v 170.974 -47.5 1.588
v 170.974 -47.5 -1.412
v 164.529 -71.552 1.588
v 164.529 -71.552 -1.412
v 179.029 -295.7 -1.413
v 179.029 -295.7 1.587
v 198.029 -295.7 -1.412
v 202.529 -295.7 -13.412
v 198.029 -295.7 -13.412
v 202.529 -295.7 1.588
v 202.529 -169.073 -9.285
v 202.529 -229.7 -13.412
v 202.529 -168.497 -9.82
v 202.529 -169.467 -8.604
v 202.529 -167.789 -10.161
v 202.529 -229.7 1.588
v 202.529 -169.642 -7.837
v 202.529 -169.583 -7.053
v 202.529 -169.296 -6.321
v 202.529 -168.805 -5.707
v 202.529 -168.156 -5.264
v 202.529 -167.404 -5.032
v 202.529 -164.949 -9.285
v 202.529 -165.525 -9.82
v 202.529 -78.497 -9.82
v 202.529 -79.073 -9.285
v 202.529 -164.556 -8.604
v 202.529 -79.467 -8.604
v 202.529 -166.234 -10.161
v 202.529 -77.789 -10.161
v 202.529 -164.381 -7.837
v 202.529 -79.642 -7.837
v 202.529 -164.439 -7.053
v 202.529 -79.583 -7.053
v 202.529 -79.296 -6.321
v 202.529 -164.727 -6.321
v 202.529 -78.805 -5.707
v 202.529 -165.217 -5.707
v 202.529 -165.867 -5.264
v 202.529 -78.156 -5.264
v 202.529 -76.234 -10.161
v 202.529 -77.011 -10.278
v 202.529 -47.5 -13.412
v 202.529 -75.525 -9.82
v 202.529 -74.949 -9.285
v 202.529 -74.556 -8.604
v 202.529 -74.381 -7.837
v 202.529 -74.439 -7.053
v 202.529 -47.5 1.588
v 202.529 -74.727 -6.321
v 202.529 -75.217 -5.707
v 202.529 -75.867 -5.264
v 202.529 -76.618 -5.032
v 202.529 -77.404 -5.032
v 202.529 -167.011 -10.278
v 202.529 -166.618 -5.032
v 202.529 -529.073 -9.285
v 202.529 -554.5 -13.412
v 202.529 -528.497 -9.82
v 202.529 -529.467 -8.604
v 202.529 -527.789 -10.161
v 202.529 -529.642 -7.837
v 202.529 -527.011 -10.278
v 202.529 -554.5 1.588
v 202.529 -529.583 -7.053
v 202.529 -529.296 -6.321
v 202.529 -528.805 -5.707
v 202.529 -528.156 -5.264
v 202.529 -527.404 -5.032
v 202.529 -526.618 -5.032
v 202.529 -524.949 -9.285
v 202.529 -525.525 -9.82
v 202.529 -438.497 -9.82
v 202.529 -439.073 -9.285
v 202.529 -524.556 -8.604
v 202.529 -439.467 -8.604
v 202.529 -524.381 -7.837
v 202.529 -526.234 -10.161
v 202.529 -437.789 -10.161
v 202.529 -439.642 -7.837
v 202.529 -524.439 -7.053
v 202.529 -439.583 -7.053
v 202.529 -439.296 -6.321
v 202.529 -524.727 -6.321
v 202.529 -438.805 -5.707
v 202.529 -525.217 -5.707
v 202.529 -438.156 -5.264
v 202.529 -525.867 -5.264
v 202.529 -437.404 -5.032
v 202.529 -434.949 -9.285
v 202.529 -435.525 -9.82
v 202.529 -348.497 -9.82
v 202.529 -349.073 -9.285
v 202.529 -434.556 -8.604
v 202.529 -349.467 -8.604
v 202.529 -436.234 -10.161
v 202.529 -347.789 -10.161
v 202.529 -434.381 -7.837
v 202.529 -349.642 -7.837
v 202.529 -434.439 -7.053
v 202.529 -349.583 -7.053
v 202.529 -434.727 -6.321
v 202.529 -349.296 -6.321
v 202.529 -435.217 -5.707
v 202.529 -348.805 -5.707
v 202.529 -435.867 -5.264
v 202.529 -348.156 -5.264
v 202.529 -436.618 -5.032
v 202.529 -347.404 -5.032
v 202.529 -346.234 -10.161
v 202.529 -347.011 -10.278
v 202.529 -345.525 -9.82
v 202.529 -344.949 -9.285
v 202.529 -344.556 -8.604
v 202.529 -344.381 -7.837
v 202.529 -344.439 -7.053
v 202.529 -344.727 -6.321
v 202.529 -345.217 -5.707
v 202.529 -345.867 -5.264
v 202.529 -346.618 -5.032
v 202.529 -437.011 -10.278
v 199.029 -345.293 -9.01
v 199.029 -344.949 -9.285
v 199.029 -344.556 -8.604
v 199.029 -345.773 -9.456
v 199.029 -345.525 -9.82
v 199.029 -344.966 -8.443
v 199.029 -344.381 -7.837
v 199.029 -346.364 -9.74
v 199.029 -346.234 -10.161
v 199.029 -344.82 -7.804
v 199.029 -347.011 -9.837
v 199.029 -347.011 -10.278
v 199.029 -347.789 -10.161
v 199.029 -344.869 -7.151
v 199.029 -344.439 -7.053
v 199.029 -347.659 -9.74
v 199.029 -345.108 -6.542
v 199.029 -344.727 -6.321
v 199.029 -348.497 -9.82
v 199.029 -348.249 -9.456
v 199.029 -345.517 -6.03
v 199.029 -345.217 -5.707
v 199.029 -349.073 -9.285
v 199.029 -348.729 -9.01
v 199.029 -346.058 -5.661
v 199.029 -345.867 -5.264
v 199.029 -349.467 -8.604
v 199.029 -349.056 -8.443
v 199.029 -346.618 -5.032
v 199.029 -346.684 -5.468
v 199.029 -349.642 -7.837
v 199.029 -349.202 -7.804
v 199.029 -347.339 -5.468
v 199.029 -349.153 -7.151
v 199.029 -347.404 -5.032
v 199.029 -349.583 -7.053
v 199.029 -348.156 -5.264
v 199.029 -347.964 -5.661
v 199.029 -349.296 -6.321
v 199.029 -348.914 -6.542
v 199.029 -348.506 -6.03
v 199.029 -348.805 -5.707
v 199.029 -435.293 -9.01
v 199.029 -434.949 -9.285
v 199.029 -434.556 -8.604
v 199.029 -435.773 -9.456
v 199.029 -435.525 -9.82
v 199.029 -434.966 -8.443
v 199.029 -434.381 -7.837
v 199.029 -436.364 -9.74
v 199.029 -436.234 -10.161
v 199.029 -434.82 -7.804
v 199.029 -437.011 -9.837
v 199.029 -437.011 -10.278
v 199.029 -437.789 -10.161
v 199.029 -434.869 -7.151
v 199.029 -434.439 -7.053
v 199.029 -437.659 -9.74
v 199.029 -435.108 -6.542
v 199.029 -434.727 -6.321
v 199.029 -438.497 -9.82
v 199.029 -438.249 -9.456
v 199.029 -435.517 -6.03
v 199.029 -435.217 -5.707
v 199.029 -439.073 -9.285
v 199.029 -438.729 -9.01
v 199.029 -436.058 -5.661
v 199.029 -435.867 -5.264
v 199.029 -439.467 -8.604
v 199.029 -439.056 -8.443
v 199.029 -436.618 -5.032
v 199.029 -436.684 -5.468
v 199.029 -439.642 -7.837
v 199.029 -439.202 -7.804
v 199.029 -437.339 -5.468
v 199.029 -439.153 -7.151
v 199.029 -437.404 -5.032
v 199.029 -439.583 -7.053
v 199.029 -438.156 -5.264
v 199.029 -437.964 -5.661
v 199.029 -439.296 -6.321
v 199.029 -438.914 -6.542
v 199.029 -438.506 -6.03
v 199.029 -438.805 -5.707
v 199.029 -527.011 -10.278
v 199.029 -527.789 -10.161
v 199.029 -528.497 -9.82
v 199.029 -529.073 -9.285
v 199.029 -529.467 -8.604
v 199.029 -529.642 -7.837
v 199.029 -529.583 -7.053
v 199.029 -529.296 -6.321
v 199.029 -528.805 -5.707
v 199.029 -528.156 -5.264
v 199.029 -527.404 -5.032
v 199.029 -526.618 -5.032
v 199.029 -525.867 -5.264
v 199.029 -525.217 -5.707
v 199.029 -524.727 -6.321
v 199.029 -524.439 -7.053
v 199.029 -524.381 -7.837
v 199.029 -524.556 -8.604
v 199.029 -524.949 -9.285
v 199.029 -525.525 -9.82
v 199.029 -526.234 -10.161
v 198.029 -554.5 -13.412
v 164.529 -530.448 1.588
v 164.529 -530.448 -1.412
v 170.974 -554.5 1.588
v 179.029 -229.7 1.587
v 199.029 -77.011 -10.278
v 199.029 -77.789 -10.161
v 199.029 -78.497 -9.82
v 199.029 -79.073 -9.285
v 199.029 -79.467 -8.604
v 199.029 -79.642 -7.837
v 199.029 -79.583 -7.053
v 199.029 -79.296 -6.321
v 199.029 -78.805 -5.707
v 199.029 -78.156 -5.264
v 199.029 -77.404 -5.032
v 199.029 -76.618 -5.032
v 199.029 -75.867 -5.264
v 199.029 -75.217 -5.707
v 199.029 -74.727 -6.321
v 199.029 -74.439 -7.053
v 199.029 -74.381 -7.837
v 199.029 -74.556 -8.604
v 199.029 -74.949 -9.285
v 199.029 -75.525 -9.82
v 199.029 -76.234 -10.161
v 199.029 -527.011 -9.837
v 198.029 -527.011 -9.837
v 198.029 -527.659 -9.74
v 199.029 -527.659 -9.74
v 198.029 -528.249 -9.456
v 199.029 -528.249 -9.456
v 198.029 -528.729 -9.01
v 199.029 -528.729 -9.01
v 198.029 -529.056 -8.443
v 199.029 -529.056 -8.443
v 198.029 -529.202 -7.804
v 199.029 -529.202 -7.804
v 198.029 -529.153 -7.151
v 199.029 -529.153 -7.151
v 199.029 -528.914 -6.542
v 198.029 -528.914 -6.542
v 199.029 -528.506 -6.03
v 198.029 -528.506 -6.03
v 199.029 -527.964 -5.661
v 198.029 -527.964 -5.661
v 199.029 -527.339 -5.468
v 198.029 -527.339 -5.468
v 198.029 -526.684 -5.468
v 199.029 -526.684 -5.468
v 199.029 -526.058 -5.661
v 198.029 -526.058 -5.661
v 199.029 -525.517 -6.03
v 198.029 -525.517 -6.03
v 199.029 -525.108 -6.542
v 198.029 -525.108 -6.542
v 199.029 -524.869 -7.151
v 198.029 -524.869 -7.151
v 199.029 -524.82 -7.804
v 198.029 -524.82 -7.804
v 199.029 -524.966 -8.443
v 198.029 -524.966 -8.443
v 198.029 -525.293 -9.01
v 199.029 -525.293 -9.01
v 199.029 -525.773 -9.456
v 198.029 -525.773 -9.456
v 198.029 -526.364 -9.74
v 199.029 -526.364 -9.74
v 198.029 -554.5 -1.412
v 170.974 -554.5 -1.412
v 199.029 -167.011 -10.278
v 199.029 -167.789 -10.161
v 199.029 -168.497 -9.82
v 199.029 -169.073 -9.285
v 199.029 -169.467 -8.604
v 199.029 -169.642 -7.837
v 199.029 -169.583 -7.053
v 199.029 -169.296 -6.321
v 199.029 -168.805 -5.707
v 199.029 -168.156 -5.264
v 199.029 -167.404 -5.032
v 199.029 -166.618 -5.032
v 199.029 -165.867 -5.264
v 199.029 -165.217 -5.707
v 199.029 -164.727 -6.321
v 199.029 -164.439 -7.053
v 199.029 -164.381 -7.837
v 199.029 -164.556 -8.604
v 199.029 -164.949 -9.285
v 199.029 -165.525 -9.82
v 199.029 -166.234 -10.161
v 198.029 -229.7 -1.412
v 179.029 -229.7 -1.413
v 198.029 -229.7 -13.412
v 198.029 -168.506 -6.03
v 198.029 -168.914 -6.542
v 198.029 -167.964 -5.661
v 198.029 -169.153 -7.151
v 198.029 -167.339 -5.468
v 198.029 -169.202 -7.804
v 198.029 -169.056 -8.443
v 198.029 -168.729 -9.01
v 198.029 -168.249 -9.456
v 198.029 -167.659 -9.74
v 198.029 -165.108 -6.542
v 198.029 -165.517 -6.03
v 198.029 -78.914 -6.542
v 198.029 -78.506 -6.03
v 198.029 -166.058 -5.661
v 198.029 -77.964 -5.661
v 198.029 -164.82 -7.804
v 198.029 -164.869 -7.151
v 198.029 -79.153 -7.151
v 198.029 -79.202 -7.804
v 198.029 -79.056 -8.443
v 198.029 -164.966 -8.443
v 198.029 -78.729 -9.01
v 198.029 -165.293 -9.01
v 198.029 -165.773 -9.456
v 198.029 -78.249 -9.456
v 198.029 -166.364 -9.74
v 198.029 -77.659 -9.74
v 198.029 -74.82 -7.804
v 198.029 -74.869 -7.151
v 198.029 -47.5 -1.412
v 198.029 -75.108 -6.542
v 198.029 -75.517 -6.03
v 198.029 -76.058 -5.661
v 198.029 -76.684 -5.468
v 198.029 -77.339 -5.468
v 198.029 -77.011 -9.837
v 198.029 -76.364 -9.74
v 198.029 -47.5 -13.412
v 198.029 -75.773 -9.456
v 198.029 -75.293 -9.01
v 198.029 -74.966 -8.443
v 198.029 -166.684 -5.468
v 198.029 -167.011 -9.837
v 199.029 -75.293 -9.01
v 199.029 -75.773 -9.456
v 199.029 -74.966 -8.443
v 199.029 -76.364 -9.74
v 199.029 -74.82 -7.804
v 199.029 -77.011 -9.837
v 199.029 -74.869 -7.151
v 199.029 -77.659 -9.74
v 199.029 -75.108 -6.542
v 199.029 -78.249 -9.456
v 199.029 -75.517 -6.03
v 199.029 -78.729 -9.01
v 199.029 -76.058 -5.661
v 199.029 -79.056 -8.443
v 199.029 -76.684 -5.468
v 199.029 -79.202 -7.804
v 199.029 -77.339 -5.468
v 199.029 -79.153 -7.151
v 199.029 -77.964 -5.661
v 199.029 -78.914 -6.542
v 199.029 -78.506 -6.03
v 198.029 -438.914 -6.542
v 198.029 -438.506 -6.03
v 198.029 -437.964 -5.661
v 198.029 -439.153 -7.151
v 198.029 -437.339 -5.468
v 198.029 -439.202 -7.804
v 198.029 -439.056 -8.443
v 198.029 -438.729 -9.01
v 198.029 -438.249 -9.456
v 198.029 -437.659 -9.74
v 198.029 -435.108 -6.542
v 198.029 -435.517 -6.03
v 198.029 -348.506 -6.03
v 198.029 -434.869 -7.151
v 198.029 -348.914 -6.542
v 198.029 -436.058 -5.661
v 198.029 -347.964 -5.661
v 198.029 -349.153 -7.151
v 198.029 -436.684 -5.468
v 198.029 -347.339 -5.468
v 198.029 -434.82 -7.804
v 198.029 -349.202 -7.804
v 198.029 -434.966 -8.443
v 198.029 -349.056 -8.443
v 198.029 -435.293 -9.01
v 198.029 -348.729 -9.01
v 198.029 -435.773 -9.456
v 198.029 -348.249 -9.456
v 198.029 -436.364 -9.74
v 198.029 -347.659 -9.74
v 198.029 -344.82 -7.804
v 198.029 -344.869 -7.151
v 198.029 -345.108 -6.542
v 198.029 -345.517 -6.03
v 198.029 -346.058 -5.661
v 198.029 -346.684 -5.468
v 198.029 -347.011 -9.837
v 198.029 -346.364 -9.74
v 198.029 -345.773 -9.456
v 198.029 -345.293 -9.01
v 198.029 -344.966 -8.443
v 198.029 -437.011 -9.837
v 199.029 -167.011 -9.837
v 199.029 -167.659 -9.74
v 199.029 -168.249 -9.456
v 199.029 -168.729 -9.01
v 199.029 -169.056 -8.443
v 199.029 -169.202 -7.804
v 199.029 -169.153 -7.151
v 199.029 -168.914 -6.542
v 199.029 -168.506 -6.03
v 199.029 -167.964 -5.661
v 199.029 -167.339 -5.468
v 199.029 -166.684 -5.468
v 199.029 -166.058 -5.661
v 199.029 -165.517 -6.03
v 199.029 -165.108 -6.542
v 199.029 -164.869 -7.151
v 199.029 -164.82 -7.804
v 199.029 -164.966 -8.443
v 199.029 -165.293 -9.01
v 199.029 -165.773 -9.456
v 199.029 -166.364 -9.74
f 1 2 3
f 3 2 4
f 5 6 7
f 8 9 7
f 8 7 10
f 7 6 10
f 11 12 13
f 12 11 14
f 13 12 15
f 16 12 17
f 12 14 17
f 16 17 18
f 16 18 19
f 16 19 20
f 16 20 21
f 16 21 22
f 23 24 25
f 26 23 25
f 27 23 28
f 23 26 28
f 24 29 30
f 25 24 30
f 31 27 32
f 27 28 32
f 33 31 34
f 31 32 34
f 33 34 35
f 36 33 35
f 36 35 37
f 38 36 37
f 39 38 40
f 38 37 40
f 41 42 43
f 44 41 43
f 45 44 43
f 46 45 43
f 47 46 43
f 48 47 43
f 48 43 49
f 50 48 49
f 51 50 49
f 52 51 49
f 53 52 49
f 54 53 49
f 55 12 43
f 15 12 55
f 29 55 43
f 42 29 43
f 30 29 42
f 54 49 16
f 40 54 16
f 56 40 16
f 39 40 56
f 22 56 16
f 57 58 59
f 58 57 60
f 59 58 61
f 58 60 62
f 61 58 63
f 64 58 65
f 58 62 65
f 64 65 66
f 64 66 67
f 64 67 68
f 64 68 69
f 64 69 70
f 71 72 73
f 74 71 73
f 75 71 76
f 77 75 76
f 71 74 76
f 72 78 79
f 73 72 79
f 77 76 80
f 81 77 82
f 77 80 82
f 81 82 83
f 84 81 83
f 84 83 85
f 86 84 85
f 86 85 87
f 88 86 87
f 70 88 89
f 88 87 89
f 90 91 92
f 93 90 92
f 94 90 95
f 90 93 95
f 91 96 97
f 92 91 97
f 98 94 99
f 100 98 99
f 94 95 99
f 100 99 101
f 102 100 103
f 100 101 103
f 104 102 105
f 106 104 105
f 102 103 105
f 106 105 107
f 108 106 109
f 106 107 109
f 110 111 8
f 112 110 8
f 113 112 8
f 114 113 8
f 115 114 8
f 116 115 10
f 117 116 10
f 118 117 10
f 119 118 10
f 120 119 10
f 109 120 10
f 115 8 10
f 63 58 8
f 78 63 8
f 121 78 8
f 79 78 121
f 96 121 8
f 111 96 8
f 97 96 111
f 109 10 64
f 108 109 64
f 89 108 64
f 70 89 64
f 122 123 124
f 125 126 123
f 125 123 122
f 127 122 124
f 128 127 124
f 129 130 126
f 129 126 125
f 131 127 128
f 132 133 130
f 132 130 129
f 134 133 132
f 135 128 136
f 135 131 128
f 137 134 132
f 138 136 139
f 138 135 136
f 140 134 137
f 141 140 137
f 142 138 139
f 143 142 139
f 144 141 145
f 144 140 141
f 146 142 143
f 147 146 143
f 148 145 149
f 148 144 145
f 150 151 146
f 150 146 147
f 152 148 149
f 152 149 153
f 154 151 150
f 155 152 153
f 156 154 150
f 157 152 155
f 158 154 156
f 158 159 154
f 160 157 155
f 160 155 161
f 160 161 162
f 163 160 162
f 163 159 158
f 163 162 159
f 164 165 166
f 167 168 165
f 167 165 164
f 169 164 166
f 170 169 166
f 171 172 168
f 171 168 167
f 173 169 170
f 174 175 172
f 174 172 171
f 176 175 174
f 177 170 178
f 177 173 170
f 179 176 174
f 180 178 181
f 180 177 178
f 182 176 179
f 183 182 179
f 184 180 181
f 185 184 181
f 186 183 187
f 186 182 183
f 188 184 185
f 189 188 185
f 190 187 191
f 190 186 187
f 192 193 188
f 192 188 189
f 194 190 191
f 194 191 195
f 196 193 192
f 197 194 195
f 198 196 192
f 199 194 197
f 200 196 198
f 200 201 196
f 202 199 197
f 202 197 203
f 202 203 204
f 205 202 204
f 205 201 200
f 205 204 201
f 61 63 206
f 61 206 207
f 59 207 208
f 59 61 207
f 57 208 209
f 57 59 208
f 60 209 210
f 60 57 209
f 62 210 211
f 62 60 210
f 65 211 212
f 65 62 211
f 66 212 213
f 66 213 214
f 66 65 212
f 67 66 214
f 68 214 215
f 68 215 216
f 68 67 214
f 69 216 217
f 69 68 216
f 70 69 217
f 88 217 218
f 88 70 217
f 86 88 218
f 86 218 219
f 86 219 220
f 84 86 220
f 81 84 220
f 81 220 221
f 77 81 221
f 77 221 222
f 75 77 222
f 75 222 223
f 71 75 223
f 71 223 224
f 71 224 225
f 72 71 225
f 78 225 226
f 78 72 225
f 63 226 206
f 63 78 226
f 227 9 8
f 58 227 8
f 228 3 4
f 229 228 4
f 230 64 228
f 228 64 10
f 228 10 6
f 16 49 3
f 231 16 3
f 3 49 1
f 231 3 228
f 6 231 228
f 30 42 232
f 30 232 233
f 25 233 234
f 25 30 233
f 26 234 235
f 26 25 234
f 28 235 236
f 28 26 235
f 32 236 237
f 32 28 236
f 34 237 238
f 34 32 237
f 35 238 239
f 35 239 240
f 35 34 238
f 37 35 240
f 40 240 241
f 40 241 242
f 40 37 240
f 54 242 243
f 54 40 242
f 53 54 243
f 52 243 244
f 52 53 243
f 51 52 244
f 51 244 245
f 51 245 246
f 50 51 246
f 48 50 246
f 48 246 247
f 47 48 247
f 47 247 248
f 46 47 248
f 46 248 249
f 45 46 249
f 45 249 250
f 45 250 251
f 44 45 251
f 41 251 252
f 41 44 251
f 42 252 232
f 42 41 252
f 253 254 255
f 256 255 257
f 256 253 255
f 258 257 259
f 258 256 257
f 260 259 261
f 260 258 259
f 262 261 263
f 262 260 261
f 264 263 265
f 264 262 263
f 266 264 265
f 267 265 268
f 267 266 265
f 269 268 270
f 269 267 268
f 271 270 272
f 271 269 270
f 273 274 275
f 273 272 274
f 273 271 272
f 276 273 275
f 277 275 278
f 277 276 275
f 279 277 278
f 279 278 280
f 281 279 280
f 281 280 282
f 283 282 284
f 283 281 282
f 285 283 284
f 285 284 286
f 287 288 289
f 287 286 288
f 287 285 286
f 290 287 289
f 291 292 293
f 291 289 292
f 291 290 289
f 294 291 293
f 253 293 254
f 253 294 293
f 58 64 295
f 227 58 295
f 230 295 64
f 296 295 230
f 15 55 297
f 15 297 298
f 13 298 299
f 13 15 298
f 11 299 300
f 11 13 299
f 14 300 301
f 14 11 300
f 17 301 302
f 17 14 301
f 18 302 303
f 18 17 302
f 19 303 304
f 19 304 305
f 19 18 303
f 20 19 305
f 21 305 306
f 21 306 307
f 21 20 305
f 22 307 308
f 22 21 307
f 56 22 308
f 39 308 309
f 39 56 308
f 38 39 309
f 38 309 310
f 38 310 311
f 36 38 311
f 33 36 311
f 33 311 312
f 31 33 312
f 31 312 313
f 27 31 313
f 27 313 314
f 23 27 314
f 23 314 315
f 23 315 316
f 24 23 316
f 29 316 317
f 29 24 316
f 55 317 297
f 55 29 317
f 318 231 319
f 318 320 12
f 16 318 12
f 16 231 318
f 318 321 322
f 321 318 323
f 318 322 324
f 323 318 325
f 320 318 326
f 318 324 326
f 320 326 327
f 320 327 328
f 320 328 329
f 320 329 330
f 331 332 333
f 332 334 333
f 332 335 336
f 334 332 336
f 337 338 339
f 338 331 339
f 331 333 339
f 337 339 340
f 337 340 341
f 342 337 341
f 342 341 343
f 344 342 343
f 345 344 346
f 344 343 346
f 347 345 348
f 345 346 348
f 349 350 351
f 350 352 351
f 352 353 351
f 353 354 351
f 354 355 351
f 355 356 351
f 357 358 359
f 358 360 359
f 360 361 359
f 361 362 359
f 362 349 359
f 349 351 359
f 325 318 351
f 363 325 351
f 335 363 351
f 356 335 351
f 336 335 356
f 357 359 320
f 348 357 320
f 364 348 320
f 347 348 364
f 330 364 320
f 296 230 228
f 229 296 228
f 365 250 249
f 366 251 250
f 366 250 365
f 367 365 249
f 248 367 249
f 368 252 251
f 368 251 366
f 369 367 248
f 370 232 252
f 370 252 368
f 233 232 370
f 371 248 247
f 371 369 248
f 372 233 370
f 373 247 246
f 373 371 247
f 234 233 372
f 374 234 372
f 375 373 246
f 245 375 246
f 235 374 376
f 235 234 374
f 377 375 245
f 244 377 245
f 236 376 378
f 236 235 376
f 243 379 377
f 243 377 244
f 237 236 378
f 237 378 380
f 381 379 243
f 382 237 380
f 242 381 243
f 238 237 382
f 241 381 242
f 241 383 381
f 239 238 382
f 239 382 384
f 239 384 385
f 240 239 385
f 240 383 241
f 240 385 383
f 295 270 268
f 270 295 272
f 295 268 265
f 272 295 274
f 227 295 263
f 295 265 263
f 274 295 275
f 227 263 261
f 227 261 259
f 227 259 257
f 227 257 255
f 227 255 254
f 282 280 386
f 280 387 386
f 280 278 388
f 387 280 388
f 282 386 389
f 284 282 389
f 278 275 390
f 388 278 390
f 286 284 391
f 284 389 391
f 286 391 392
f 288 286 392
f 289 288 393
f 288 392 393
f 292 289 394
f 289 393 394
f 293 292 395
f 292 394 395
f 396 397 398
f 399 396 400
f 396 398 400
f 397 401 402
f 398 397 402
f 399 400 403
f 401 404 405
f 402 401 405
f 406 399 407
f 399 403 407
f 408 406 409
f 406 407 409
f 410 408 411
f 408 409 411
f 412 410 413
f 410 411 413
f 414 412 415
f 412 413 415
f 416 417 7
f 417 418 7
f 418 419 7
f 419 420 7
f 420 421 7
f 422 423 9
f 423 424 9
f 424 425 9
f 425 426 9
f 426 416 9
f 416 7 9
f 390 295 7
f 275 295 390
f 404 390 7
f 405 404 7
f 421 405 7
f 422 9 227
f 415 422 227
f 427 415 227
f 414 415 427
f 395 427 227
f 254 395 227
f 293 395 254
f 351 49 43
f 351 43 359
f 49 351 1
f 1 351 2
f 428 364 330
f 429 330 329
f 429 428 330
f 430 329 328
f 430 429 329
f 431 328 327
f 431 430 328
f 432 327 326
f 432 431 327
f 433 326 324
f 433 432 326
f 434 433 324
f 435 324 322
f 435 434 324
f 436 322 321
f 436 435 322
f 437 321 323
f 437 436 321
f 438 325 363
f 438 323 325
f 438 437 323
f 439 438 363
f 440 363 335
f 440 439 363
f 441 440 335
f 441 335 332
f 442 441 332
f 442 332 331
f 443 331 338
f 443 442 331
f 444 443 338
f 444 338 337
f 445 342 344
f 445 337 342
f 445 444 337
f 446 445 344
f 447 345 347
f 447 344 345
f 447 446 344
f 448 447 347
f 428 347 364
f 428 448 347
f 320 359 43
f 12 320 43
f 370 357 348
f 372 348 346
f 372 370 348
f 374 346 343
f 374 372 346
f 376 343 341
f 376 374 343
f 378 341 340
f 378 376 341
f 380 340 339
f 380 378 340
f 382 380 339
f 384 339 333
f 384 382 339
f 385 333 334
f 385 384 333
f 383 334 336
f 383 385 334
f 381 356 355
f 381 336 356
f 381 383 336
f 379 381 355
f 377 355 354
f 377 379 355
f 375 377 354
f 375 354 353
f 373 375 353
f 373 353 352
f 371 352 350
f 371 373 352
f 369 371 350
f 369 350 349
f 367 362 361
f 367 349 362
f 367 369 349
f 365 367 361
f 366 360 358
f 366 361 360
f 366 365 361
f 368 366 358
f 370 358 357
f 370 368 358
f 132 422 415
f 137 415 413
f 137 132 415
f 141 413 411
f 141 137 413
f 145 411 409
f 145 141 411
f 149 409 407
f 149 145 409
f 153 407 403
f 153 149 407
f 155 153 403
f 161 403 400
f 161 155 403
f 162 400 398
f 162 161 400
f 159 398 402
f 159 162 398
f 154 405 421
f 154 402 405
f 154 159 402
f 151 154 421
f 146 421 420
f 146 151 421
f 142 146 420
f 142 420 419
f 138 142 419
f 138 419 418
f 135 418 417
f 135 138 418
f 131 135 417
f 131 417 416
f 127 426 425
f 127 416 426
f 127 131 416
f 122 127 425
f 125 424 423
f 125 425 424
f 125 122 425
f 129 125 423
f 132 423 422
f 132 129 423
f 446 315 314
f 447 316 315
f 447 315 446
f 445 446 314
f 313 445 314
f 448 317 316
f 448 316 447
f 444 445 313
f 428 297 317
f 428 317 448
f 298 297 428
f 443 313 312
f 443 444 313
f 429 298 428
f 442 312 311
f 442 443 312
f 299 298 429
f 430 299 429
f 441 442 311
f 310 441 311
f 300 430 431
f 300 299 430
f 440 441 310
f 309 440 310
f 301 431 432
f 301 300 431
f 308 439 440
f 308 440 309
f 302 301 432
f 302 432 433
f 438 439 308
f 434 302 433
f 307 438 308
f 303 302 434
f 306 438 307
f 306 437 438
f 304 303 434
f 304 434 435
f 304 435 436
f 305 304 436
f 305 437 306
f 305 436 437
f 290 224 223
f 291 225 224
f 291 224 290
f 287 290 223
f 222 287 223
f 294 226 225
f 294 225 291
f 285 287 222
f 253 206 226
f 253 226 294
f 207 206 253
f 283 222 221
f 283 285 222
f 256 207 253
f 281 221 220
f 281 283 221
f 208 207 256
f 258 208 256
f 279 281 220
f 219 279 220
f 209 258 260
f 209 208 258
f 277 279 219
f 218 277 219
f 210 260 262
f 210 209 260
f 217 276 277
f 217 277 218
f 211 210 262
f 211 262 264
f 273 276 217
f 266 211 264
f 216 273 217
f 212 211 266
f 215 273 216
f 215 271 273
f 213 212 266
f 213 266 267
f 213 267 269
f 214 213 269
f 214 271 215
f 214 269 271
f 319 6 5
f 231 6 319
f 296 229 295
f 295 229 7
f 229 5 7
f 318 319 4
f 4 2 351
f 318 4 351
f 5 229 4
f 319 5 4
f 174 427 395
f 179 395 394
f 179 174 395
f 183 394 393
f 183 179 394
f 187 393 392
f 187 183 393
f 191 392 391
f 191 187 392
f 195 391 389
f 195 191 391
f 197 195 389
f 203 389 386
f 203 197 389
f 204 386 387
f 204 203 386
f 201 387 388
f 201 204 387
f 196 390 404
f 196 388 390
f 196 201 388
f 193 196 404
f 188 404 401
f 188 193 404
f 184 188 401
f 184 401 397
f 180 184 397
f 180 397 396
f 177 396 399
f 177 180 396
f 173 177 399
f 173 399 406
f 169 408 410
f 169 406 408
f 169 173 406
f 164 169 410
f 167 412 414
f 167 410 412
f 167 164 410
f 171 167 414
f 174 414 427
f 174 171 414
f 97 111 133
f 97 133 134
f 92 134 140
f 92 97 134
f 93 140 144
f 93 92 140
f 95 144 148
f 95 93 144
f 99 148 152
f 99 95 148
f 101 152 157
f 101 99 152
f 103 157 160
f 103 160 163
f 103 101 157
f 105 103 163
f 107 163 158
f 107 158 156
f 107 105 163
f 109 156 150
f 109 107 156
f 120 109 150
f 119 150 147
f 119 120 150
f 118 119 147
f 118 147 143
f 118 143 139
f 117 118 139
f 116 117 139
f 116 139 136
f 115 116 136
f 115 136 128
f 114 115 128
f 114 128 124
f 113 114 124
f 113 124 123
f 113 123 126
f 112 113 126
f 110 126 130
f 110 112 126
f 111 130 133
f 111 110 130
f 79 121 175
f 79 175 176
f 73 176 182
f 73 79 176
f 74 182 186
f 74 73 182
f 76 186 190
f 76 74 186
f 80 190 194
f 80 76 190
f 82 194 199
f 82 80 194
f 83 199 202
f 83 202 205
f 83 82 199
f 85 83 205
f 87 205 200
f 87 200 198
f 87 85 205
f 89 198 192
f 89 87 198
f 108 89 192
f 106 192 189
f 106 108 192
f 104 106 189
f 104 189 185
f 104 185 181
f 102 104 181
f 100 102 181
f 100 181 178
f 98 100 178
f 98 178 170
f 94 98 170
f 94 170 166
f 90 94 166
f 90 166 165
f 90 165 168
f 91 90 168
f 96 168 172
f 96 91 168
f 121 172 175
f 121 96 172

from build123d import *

# Parameters (mm, degrees)
EXTRUDE1_DEPTH          = 50.8
SKETCH3_W               = 60
SKETCH3_H               = 98.6
CUT_EXTRUDE1_DEPTH      = 48.5
CUT_EXTRUDE1_DEPTH_BACK = 650.5
EXTRUDE2_DEPTH          = 253.5
EXTRUDE2_DEPTH_BACK     = 253.5
EXTRUDE8_DEPTH          = 75
SKETCH4_W               = 30
SKETCH4_H               = 66
CUT_EXTRUDE2_DEPTH      = 46
LPATTERN1_COUNT         = 6
LPATTERN1_PITCH         = 90
SKETCH10_R              = 2.25
EXTRUDE7_DEPTH          = 102.6
SKETCH13_W              = 158
SKETCH13_H              = 135
SKETCH13_W_2            = 38
SKETCH13_H_2            = 15
EXTRUDE10_DEPTH         = 100
EXTRUDE10_DEPTH_BACK    = 700


with BuildPart() as part:
    # Sketch2 → Extrude1 (new body, symmetric)
    with BuildSketch(Plane.XY):
        Polygon((168.229133429, 47.5), (168.229133429, -47.5), (159.029133429, -81.83486743), (159.029133429, -520.16513257), (168.229133429, -554.5), (168.229133429, -649.5), (204.029133429, -649.5), (204.029133429, 47.5), align=None)
    extrude(amount=EXTRUDE1_DEPTH, both=True)

    # Sketch3 → Cut-Extrude1 (cut, two sides)
    with BuildSketch(Plane(origin=(0, 0, 0), x_dir=(1, 0, 0), z_dir=(0, 1, 0))) as cut_extrude1_sk:
        with Locations((172.529133429, 0)):
            Rectangle(SKETCH3_W, SKETCH3_H)
    extrude(amount=CUT_EXTRUDE1_DEPTH, mode=Mode.SUBTRACT)
    extrude(cut_extrude1_sk.sketch, amount=-CUT_EXTRUDE1_DEPTH_BACK, mode=Mode.SUBTRACT)


with BuildPart() as body_2:
    # Sketch5 → Extrude2 (new body, two sides)
    with BuildSketch(Plane(origin=(0, -301, 0), x_dir=(1, 0, 0), z_dir=(0, 1, 0))) as extrude2_sk:
        Polygon((198.029133429, 13.4125), (202.529133429, 13.4125), (202.529133429, -1.5875), (164.529133429, -1.5875), (164.529133429, 1.4125), (198.029133429, 1.4125), align=None)
    extrude(amount=EXTRUDE2_DEPTH)
    extrude(extrude2_sk.sketch, amount=-EXTRUDE2_DEPTH_BACK)

    # Sketch11 → Extrude8 (cut, symmetric)
    with BuildSketch(Plane.XY):
        Polygon((170.973907148, -47.5), (153.959133429, -111), (130.029133429, -111), (130.029133429, -11), (170.973907148, -11), align=None)
        Polygon((153.959133429, -491), (130.029133429, -491), (130.029133429, -591), (170.973907148, -591), (170.973907148, -554.5), align=None)
    extrude(amount=EXTRUDE8_DEPTH, both=True, mode=Mode.SUBTRACT)


with BuildPart() as cut_extrude2_tool:
    # Sketch4 → Cut-Extrude2 (new body, symmetric)
    with BuildSketch(Plane.XY):
        with Locations((194.029133429, -262.7)):
            Rectangle(SKETCH4_W, SKETCH4_H)
    extrude(amount=CUT_EXTRUDE2_DEPTH, both=True)


with BuildPart() as part_1:
    add(part.part)

    # Cut-Extrude2: cut by cut_extrude2_tool
    add(cut_extrude2_tool.part, mode=Mode.SUBTRACT)


with BuildPart() as body_2_1:
    add(body_2.part)

    # Cut-Extrude2: cut by cut_extrude2_tool
    add(cut_extrude2_tool.part, mode=Mode.SUBTRACT)


with BuildPart() as tapped_hole_for_8_32_helicoil1_tool:
    # Sketch34 → Tapped Hole for #8-32 Helicoil1 (revolve)
    with BuildSketch(Plane(origin=(204.029133429, -77.011124935, -7.640243296), x_dir=(0, 0, -1), z_dir=(0, 1, 0))):
        Polygon((0, 0), (0, 45), (2.1971, 45), (2.1971, 5), (2.63779, 5), (2.63779, 0), align=None)
    tapped_hole_for_8_32_helicoil1 = revolve(axis=Axis((210.379133429, -77.011124935, -7.640243296), (-1, 0, 0)))


with BuildPart() as part_2:
    add(part_1.part)

    # Tapped Hole for #8-32 Helicoil1: cut by tapped_hole_for_8_32_helicoil1_tool
    add(tapped_hole_for_8_32_helicoil1_tool.part, mode=Mode.SUBTRACT)


with BuildPart() as body_2_2:
    add(body_2_1.part)

    # Tapped Hole for #8-32 Helicoil1: cut by tapped_hole_for_8_32_helicoil1_tool
    add(tapped_hole_for_8_32_helicoil1_tool.part, mode=Mode.SUBTRACT)


with BuildPart() as lpattern1_tool:
    # LPattern1: Tapped Hole for #8-32 Helicoil1 ×6, 1 skipped
    with Locations(*[(0, -i * LPATTERN1_PITCH, 0) for i in range(1, LPATTERN1_COUNT) if i not in (2,)]):
        add(tapped_hole_for_8_32_helicoil1)


with BuildPart() as part_3:
    add(part_2.part)

    # LPattern1: cut by lpattern1_tool
    add(lpattern1_tool.part, mode=Mode.SUBTRACT)

    # Sketch10 → Extrude7 (cut, through all)
    with BuildSketch(Plane.XY.offset(50.8)):
        with Locations((192.854133429, -102.5)):
            Circle(SKETCH10_R)
        with Locations((192.854133429, -117.5)):
            Circle(SKETCH10_R)
        with Locations((192.854133429, -327.5)):
            Circle(SKETCH10_R)
        with Locations((192.854133429, -312.5)):
            Circle(SKETCH10_R)
        with Locations((192.854133429, -42.5)):
            Circle(SKETCH10_R)
        with Locations((192.854133429, -27.5)):
            Circle(SKETCH10_R)
        with Locations((192.854133429, -586.5)):
            Circle(SKETCH10_R)
        with Locations((192.854133429, -601.5)):
            Circle(SKETCH10_R)
    extrude(amount=-EXTRUDE7_DEPTH, mode=Mode.SUBTRACT)

    # Sketch13 → Extrude10 (cut, two sides)
    with BuildSketch(Plane(origin=(0, 0, 0), x_dir=(1, 0, 0), z_dir=(0, 1, 0))) as extrude10_sk:
        with Locations((183.529133429, 5.9125)):
            Rectangle(SKETCH13_W, SKETCH13_H)
        with Locations((183.529133429, 5.9125)):
            Rectangle(SKETCH13_W_2, SKETCH13_H_2, mode=Mode.SUBTRACT)
    extrude(amount=EXTRUDE10_DEPTH, mode=Mode.SUBTRACT)
    extrude(extrude10_sk.sketch, amount=-EXTRUDE10_DEPTH_BACK, mode=Mode.SUBTRACT)


with BuildPart() as body_2_3:
    add(body_2_2.part)

    # LPattern1: cut by lpattern1_tool
    add(lpattern1_tool.part, mode=Mode.SUBTRACT)


solid = body_2_3.part
